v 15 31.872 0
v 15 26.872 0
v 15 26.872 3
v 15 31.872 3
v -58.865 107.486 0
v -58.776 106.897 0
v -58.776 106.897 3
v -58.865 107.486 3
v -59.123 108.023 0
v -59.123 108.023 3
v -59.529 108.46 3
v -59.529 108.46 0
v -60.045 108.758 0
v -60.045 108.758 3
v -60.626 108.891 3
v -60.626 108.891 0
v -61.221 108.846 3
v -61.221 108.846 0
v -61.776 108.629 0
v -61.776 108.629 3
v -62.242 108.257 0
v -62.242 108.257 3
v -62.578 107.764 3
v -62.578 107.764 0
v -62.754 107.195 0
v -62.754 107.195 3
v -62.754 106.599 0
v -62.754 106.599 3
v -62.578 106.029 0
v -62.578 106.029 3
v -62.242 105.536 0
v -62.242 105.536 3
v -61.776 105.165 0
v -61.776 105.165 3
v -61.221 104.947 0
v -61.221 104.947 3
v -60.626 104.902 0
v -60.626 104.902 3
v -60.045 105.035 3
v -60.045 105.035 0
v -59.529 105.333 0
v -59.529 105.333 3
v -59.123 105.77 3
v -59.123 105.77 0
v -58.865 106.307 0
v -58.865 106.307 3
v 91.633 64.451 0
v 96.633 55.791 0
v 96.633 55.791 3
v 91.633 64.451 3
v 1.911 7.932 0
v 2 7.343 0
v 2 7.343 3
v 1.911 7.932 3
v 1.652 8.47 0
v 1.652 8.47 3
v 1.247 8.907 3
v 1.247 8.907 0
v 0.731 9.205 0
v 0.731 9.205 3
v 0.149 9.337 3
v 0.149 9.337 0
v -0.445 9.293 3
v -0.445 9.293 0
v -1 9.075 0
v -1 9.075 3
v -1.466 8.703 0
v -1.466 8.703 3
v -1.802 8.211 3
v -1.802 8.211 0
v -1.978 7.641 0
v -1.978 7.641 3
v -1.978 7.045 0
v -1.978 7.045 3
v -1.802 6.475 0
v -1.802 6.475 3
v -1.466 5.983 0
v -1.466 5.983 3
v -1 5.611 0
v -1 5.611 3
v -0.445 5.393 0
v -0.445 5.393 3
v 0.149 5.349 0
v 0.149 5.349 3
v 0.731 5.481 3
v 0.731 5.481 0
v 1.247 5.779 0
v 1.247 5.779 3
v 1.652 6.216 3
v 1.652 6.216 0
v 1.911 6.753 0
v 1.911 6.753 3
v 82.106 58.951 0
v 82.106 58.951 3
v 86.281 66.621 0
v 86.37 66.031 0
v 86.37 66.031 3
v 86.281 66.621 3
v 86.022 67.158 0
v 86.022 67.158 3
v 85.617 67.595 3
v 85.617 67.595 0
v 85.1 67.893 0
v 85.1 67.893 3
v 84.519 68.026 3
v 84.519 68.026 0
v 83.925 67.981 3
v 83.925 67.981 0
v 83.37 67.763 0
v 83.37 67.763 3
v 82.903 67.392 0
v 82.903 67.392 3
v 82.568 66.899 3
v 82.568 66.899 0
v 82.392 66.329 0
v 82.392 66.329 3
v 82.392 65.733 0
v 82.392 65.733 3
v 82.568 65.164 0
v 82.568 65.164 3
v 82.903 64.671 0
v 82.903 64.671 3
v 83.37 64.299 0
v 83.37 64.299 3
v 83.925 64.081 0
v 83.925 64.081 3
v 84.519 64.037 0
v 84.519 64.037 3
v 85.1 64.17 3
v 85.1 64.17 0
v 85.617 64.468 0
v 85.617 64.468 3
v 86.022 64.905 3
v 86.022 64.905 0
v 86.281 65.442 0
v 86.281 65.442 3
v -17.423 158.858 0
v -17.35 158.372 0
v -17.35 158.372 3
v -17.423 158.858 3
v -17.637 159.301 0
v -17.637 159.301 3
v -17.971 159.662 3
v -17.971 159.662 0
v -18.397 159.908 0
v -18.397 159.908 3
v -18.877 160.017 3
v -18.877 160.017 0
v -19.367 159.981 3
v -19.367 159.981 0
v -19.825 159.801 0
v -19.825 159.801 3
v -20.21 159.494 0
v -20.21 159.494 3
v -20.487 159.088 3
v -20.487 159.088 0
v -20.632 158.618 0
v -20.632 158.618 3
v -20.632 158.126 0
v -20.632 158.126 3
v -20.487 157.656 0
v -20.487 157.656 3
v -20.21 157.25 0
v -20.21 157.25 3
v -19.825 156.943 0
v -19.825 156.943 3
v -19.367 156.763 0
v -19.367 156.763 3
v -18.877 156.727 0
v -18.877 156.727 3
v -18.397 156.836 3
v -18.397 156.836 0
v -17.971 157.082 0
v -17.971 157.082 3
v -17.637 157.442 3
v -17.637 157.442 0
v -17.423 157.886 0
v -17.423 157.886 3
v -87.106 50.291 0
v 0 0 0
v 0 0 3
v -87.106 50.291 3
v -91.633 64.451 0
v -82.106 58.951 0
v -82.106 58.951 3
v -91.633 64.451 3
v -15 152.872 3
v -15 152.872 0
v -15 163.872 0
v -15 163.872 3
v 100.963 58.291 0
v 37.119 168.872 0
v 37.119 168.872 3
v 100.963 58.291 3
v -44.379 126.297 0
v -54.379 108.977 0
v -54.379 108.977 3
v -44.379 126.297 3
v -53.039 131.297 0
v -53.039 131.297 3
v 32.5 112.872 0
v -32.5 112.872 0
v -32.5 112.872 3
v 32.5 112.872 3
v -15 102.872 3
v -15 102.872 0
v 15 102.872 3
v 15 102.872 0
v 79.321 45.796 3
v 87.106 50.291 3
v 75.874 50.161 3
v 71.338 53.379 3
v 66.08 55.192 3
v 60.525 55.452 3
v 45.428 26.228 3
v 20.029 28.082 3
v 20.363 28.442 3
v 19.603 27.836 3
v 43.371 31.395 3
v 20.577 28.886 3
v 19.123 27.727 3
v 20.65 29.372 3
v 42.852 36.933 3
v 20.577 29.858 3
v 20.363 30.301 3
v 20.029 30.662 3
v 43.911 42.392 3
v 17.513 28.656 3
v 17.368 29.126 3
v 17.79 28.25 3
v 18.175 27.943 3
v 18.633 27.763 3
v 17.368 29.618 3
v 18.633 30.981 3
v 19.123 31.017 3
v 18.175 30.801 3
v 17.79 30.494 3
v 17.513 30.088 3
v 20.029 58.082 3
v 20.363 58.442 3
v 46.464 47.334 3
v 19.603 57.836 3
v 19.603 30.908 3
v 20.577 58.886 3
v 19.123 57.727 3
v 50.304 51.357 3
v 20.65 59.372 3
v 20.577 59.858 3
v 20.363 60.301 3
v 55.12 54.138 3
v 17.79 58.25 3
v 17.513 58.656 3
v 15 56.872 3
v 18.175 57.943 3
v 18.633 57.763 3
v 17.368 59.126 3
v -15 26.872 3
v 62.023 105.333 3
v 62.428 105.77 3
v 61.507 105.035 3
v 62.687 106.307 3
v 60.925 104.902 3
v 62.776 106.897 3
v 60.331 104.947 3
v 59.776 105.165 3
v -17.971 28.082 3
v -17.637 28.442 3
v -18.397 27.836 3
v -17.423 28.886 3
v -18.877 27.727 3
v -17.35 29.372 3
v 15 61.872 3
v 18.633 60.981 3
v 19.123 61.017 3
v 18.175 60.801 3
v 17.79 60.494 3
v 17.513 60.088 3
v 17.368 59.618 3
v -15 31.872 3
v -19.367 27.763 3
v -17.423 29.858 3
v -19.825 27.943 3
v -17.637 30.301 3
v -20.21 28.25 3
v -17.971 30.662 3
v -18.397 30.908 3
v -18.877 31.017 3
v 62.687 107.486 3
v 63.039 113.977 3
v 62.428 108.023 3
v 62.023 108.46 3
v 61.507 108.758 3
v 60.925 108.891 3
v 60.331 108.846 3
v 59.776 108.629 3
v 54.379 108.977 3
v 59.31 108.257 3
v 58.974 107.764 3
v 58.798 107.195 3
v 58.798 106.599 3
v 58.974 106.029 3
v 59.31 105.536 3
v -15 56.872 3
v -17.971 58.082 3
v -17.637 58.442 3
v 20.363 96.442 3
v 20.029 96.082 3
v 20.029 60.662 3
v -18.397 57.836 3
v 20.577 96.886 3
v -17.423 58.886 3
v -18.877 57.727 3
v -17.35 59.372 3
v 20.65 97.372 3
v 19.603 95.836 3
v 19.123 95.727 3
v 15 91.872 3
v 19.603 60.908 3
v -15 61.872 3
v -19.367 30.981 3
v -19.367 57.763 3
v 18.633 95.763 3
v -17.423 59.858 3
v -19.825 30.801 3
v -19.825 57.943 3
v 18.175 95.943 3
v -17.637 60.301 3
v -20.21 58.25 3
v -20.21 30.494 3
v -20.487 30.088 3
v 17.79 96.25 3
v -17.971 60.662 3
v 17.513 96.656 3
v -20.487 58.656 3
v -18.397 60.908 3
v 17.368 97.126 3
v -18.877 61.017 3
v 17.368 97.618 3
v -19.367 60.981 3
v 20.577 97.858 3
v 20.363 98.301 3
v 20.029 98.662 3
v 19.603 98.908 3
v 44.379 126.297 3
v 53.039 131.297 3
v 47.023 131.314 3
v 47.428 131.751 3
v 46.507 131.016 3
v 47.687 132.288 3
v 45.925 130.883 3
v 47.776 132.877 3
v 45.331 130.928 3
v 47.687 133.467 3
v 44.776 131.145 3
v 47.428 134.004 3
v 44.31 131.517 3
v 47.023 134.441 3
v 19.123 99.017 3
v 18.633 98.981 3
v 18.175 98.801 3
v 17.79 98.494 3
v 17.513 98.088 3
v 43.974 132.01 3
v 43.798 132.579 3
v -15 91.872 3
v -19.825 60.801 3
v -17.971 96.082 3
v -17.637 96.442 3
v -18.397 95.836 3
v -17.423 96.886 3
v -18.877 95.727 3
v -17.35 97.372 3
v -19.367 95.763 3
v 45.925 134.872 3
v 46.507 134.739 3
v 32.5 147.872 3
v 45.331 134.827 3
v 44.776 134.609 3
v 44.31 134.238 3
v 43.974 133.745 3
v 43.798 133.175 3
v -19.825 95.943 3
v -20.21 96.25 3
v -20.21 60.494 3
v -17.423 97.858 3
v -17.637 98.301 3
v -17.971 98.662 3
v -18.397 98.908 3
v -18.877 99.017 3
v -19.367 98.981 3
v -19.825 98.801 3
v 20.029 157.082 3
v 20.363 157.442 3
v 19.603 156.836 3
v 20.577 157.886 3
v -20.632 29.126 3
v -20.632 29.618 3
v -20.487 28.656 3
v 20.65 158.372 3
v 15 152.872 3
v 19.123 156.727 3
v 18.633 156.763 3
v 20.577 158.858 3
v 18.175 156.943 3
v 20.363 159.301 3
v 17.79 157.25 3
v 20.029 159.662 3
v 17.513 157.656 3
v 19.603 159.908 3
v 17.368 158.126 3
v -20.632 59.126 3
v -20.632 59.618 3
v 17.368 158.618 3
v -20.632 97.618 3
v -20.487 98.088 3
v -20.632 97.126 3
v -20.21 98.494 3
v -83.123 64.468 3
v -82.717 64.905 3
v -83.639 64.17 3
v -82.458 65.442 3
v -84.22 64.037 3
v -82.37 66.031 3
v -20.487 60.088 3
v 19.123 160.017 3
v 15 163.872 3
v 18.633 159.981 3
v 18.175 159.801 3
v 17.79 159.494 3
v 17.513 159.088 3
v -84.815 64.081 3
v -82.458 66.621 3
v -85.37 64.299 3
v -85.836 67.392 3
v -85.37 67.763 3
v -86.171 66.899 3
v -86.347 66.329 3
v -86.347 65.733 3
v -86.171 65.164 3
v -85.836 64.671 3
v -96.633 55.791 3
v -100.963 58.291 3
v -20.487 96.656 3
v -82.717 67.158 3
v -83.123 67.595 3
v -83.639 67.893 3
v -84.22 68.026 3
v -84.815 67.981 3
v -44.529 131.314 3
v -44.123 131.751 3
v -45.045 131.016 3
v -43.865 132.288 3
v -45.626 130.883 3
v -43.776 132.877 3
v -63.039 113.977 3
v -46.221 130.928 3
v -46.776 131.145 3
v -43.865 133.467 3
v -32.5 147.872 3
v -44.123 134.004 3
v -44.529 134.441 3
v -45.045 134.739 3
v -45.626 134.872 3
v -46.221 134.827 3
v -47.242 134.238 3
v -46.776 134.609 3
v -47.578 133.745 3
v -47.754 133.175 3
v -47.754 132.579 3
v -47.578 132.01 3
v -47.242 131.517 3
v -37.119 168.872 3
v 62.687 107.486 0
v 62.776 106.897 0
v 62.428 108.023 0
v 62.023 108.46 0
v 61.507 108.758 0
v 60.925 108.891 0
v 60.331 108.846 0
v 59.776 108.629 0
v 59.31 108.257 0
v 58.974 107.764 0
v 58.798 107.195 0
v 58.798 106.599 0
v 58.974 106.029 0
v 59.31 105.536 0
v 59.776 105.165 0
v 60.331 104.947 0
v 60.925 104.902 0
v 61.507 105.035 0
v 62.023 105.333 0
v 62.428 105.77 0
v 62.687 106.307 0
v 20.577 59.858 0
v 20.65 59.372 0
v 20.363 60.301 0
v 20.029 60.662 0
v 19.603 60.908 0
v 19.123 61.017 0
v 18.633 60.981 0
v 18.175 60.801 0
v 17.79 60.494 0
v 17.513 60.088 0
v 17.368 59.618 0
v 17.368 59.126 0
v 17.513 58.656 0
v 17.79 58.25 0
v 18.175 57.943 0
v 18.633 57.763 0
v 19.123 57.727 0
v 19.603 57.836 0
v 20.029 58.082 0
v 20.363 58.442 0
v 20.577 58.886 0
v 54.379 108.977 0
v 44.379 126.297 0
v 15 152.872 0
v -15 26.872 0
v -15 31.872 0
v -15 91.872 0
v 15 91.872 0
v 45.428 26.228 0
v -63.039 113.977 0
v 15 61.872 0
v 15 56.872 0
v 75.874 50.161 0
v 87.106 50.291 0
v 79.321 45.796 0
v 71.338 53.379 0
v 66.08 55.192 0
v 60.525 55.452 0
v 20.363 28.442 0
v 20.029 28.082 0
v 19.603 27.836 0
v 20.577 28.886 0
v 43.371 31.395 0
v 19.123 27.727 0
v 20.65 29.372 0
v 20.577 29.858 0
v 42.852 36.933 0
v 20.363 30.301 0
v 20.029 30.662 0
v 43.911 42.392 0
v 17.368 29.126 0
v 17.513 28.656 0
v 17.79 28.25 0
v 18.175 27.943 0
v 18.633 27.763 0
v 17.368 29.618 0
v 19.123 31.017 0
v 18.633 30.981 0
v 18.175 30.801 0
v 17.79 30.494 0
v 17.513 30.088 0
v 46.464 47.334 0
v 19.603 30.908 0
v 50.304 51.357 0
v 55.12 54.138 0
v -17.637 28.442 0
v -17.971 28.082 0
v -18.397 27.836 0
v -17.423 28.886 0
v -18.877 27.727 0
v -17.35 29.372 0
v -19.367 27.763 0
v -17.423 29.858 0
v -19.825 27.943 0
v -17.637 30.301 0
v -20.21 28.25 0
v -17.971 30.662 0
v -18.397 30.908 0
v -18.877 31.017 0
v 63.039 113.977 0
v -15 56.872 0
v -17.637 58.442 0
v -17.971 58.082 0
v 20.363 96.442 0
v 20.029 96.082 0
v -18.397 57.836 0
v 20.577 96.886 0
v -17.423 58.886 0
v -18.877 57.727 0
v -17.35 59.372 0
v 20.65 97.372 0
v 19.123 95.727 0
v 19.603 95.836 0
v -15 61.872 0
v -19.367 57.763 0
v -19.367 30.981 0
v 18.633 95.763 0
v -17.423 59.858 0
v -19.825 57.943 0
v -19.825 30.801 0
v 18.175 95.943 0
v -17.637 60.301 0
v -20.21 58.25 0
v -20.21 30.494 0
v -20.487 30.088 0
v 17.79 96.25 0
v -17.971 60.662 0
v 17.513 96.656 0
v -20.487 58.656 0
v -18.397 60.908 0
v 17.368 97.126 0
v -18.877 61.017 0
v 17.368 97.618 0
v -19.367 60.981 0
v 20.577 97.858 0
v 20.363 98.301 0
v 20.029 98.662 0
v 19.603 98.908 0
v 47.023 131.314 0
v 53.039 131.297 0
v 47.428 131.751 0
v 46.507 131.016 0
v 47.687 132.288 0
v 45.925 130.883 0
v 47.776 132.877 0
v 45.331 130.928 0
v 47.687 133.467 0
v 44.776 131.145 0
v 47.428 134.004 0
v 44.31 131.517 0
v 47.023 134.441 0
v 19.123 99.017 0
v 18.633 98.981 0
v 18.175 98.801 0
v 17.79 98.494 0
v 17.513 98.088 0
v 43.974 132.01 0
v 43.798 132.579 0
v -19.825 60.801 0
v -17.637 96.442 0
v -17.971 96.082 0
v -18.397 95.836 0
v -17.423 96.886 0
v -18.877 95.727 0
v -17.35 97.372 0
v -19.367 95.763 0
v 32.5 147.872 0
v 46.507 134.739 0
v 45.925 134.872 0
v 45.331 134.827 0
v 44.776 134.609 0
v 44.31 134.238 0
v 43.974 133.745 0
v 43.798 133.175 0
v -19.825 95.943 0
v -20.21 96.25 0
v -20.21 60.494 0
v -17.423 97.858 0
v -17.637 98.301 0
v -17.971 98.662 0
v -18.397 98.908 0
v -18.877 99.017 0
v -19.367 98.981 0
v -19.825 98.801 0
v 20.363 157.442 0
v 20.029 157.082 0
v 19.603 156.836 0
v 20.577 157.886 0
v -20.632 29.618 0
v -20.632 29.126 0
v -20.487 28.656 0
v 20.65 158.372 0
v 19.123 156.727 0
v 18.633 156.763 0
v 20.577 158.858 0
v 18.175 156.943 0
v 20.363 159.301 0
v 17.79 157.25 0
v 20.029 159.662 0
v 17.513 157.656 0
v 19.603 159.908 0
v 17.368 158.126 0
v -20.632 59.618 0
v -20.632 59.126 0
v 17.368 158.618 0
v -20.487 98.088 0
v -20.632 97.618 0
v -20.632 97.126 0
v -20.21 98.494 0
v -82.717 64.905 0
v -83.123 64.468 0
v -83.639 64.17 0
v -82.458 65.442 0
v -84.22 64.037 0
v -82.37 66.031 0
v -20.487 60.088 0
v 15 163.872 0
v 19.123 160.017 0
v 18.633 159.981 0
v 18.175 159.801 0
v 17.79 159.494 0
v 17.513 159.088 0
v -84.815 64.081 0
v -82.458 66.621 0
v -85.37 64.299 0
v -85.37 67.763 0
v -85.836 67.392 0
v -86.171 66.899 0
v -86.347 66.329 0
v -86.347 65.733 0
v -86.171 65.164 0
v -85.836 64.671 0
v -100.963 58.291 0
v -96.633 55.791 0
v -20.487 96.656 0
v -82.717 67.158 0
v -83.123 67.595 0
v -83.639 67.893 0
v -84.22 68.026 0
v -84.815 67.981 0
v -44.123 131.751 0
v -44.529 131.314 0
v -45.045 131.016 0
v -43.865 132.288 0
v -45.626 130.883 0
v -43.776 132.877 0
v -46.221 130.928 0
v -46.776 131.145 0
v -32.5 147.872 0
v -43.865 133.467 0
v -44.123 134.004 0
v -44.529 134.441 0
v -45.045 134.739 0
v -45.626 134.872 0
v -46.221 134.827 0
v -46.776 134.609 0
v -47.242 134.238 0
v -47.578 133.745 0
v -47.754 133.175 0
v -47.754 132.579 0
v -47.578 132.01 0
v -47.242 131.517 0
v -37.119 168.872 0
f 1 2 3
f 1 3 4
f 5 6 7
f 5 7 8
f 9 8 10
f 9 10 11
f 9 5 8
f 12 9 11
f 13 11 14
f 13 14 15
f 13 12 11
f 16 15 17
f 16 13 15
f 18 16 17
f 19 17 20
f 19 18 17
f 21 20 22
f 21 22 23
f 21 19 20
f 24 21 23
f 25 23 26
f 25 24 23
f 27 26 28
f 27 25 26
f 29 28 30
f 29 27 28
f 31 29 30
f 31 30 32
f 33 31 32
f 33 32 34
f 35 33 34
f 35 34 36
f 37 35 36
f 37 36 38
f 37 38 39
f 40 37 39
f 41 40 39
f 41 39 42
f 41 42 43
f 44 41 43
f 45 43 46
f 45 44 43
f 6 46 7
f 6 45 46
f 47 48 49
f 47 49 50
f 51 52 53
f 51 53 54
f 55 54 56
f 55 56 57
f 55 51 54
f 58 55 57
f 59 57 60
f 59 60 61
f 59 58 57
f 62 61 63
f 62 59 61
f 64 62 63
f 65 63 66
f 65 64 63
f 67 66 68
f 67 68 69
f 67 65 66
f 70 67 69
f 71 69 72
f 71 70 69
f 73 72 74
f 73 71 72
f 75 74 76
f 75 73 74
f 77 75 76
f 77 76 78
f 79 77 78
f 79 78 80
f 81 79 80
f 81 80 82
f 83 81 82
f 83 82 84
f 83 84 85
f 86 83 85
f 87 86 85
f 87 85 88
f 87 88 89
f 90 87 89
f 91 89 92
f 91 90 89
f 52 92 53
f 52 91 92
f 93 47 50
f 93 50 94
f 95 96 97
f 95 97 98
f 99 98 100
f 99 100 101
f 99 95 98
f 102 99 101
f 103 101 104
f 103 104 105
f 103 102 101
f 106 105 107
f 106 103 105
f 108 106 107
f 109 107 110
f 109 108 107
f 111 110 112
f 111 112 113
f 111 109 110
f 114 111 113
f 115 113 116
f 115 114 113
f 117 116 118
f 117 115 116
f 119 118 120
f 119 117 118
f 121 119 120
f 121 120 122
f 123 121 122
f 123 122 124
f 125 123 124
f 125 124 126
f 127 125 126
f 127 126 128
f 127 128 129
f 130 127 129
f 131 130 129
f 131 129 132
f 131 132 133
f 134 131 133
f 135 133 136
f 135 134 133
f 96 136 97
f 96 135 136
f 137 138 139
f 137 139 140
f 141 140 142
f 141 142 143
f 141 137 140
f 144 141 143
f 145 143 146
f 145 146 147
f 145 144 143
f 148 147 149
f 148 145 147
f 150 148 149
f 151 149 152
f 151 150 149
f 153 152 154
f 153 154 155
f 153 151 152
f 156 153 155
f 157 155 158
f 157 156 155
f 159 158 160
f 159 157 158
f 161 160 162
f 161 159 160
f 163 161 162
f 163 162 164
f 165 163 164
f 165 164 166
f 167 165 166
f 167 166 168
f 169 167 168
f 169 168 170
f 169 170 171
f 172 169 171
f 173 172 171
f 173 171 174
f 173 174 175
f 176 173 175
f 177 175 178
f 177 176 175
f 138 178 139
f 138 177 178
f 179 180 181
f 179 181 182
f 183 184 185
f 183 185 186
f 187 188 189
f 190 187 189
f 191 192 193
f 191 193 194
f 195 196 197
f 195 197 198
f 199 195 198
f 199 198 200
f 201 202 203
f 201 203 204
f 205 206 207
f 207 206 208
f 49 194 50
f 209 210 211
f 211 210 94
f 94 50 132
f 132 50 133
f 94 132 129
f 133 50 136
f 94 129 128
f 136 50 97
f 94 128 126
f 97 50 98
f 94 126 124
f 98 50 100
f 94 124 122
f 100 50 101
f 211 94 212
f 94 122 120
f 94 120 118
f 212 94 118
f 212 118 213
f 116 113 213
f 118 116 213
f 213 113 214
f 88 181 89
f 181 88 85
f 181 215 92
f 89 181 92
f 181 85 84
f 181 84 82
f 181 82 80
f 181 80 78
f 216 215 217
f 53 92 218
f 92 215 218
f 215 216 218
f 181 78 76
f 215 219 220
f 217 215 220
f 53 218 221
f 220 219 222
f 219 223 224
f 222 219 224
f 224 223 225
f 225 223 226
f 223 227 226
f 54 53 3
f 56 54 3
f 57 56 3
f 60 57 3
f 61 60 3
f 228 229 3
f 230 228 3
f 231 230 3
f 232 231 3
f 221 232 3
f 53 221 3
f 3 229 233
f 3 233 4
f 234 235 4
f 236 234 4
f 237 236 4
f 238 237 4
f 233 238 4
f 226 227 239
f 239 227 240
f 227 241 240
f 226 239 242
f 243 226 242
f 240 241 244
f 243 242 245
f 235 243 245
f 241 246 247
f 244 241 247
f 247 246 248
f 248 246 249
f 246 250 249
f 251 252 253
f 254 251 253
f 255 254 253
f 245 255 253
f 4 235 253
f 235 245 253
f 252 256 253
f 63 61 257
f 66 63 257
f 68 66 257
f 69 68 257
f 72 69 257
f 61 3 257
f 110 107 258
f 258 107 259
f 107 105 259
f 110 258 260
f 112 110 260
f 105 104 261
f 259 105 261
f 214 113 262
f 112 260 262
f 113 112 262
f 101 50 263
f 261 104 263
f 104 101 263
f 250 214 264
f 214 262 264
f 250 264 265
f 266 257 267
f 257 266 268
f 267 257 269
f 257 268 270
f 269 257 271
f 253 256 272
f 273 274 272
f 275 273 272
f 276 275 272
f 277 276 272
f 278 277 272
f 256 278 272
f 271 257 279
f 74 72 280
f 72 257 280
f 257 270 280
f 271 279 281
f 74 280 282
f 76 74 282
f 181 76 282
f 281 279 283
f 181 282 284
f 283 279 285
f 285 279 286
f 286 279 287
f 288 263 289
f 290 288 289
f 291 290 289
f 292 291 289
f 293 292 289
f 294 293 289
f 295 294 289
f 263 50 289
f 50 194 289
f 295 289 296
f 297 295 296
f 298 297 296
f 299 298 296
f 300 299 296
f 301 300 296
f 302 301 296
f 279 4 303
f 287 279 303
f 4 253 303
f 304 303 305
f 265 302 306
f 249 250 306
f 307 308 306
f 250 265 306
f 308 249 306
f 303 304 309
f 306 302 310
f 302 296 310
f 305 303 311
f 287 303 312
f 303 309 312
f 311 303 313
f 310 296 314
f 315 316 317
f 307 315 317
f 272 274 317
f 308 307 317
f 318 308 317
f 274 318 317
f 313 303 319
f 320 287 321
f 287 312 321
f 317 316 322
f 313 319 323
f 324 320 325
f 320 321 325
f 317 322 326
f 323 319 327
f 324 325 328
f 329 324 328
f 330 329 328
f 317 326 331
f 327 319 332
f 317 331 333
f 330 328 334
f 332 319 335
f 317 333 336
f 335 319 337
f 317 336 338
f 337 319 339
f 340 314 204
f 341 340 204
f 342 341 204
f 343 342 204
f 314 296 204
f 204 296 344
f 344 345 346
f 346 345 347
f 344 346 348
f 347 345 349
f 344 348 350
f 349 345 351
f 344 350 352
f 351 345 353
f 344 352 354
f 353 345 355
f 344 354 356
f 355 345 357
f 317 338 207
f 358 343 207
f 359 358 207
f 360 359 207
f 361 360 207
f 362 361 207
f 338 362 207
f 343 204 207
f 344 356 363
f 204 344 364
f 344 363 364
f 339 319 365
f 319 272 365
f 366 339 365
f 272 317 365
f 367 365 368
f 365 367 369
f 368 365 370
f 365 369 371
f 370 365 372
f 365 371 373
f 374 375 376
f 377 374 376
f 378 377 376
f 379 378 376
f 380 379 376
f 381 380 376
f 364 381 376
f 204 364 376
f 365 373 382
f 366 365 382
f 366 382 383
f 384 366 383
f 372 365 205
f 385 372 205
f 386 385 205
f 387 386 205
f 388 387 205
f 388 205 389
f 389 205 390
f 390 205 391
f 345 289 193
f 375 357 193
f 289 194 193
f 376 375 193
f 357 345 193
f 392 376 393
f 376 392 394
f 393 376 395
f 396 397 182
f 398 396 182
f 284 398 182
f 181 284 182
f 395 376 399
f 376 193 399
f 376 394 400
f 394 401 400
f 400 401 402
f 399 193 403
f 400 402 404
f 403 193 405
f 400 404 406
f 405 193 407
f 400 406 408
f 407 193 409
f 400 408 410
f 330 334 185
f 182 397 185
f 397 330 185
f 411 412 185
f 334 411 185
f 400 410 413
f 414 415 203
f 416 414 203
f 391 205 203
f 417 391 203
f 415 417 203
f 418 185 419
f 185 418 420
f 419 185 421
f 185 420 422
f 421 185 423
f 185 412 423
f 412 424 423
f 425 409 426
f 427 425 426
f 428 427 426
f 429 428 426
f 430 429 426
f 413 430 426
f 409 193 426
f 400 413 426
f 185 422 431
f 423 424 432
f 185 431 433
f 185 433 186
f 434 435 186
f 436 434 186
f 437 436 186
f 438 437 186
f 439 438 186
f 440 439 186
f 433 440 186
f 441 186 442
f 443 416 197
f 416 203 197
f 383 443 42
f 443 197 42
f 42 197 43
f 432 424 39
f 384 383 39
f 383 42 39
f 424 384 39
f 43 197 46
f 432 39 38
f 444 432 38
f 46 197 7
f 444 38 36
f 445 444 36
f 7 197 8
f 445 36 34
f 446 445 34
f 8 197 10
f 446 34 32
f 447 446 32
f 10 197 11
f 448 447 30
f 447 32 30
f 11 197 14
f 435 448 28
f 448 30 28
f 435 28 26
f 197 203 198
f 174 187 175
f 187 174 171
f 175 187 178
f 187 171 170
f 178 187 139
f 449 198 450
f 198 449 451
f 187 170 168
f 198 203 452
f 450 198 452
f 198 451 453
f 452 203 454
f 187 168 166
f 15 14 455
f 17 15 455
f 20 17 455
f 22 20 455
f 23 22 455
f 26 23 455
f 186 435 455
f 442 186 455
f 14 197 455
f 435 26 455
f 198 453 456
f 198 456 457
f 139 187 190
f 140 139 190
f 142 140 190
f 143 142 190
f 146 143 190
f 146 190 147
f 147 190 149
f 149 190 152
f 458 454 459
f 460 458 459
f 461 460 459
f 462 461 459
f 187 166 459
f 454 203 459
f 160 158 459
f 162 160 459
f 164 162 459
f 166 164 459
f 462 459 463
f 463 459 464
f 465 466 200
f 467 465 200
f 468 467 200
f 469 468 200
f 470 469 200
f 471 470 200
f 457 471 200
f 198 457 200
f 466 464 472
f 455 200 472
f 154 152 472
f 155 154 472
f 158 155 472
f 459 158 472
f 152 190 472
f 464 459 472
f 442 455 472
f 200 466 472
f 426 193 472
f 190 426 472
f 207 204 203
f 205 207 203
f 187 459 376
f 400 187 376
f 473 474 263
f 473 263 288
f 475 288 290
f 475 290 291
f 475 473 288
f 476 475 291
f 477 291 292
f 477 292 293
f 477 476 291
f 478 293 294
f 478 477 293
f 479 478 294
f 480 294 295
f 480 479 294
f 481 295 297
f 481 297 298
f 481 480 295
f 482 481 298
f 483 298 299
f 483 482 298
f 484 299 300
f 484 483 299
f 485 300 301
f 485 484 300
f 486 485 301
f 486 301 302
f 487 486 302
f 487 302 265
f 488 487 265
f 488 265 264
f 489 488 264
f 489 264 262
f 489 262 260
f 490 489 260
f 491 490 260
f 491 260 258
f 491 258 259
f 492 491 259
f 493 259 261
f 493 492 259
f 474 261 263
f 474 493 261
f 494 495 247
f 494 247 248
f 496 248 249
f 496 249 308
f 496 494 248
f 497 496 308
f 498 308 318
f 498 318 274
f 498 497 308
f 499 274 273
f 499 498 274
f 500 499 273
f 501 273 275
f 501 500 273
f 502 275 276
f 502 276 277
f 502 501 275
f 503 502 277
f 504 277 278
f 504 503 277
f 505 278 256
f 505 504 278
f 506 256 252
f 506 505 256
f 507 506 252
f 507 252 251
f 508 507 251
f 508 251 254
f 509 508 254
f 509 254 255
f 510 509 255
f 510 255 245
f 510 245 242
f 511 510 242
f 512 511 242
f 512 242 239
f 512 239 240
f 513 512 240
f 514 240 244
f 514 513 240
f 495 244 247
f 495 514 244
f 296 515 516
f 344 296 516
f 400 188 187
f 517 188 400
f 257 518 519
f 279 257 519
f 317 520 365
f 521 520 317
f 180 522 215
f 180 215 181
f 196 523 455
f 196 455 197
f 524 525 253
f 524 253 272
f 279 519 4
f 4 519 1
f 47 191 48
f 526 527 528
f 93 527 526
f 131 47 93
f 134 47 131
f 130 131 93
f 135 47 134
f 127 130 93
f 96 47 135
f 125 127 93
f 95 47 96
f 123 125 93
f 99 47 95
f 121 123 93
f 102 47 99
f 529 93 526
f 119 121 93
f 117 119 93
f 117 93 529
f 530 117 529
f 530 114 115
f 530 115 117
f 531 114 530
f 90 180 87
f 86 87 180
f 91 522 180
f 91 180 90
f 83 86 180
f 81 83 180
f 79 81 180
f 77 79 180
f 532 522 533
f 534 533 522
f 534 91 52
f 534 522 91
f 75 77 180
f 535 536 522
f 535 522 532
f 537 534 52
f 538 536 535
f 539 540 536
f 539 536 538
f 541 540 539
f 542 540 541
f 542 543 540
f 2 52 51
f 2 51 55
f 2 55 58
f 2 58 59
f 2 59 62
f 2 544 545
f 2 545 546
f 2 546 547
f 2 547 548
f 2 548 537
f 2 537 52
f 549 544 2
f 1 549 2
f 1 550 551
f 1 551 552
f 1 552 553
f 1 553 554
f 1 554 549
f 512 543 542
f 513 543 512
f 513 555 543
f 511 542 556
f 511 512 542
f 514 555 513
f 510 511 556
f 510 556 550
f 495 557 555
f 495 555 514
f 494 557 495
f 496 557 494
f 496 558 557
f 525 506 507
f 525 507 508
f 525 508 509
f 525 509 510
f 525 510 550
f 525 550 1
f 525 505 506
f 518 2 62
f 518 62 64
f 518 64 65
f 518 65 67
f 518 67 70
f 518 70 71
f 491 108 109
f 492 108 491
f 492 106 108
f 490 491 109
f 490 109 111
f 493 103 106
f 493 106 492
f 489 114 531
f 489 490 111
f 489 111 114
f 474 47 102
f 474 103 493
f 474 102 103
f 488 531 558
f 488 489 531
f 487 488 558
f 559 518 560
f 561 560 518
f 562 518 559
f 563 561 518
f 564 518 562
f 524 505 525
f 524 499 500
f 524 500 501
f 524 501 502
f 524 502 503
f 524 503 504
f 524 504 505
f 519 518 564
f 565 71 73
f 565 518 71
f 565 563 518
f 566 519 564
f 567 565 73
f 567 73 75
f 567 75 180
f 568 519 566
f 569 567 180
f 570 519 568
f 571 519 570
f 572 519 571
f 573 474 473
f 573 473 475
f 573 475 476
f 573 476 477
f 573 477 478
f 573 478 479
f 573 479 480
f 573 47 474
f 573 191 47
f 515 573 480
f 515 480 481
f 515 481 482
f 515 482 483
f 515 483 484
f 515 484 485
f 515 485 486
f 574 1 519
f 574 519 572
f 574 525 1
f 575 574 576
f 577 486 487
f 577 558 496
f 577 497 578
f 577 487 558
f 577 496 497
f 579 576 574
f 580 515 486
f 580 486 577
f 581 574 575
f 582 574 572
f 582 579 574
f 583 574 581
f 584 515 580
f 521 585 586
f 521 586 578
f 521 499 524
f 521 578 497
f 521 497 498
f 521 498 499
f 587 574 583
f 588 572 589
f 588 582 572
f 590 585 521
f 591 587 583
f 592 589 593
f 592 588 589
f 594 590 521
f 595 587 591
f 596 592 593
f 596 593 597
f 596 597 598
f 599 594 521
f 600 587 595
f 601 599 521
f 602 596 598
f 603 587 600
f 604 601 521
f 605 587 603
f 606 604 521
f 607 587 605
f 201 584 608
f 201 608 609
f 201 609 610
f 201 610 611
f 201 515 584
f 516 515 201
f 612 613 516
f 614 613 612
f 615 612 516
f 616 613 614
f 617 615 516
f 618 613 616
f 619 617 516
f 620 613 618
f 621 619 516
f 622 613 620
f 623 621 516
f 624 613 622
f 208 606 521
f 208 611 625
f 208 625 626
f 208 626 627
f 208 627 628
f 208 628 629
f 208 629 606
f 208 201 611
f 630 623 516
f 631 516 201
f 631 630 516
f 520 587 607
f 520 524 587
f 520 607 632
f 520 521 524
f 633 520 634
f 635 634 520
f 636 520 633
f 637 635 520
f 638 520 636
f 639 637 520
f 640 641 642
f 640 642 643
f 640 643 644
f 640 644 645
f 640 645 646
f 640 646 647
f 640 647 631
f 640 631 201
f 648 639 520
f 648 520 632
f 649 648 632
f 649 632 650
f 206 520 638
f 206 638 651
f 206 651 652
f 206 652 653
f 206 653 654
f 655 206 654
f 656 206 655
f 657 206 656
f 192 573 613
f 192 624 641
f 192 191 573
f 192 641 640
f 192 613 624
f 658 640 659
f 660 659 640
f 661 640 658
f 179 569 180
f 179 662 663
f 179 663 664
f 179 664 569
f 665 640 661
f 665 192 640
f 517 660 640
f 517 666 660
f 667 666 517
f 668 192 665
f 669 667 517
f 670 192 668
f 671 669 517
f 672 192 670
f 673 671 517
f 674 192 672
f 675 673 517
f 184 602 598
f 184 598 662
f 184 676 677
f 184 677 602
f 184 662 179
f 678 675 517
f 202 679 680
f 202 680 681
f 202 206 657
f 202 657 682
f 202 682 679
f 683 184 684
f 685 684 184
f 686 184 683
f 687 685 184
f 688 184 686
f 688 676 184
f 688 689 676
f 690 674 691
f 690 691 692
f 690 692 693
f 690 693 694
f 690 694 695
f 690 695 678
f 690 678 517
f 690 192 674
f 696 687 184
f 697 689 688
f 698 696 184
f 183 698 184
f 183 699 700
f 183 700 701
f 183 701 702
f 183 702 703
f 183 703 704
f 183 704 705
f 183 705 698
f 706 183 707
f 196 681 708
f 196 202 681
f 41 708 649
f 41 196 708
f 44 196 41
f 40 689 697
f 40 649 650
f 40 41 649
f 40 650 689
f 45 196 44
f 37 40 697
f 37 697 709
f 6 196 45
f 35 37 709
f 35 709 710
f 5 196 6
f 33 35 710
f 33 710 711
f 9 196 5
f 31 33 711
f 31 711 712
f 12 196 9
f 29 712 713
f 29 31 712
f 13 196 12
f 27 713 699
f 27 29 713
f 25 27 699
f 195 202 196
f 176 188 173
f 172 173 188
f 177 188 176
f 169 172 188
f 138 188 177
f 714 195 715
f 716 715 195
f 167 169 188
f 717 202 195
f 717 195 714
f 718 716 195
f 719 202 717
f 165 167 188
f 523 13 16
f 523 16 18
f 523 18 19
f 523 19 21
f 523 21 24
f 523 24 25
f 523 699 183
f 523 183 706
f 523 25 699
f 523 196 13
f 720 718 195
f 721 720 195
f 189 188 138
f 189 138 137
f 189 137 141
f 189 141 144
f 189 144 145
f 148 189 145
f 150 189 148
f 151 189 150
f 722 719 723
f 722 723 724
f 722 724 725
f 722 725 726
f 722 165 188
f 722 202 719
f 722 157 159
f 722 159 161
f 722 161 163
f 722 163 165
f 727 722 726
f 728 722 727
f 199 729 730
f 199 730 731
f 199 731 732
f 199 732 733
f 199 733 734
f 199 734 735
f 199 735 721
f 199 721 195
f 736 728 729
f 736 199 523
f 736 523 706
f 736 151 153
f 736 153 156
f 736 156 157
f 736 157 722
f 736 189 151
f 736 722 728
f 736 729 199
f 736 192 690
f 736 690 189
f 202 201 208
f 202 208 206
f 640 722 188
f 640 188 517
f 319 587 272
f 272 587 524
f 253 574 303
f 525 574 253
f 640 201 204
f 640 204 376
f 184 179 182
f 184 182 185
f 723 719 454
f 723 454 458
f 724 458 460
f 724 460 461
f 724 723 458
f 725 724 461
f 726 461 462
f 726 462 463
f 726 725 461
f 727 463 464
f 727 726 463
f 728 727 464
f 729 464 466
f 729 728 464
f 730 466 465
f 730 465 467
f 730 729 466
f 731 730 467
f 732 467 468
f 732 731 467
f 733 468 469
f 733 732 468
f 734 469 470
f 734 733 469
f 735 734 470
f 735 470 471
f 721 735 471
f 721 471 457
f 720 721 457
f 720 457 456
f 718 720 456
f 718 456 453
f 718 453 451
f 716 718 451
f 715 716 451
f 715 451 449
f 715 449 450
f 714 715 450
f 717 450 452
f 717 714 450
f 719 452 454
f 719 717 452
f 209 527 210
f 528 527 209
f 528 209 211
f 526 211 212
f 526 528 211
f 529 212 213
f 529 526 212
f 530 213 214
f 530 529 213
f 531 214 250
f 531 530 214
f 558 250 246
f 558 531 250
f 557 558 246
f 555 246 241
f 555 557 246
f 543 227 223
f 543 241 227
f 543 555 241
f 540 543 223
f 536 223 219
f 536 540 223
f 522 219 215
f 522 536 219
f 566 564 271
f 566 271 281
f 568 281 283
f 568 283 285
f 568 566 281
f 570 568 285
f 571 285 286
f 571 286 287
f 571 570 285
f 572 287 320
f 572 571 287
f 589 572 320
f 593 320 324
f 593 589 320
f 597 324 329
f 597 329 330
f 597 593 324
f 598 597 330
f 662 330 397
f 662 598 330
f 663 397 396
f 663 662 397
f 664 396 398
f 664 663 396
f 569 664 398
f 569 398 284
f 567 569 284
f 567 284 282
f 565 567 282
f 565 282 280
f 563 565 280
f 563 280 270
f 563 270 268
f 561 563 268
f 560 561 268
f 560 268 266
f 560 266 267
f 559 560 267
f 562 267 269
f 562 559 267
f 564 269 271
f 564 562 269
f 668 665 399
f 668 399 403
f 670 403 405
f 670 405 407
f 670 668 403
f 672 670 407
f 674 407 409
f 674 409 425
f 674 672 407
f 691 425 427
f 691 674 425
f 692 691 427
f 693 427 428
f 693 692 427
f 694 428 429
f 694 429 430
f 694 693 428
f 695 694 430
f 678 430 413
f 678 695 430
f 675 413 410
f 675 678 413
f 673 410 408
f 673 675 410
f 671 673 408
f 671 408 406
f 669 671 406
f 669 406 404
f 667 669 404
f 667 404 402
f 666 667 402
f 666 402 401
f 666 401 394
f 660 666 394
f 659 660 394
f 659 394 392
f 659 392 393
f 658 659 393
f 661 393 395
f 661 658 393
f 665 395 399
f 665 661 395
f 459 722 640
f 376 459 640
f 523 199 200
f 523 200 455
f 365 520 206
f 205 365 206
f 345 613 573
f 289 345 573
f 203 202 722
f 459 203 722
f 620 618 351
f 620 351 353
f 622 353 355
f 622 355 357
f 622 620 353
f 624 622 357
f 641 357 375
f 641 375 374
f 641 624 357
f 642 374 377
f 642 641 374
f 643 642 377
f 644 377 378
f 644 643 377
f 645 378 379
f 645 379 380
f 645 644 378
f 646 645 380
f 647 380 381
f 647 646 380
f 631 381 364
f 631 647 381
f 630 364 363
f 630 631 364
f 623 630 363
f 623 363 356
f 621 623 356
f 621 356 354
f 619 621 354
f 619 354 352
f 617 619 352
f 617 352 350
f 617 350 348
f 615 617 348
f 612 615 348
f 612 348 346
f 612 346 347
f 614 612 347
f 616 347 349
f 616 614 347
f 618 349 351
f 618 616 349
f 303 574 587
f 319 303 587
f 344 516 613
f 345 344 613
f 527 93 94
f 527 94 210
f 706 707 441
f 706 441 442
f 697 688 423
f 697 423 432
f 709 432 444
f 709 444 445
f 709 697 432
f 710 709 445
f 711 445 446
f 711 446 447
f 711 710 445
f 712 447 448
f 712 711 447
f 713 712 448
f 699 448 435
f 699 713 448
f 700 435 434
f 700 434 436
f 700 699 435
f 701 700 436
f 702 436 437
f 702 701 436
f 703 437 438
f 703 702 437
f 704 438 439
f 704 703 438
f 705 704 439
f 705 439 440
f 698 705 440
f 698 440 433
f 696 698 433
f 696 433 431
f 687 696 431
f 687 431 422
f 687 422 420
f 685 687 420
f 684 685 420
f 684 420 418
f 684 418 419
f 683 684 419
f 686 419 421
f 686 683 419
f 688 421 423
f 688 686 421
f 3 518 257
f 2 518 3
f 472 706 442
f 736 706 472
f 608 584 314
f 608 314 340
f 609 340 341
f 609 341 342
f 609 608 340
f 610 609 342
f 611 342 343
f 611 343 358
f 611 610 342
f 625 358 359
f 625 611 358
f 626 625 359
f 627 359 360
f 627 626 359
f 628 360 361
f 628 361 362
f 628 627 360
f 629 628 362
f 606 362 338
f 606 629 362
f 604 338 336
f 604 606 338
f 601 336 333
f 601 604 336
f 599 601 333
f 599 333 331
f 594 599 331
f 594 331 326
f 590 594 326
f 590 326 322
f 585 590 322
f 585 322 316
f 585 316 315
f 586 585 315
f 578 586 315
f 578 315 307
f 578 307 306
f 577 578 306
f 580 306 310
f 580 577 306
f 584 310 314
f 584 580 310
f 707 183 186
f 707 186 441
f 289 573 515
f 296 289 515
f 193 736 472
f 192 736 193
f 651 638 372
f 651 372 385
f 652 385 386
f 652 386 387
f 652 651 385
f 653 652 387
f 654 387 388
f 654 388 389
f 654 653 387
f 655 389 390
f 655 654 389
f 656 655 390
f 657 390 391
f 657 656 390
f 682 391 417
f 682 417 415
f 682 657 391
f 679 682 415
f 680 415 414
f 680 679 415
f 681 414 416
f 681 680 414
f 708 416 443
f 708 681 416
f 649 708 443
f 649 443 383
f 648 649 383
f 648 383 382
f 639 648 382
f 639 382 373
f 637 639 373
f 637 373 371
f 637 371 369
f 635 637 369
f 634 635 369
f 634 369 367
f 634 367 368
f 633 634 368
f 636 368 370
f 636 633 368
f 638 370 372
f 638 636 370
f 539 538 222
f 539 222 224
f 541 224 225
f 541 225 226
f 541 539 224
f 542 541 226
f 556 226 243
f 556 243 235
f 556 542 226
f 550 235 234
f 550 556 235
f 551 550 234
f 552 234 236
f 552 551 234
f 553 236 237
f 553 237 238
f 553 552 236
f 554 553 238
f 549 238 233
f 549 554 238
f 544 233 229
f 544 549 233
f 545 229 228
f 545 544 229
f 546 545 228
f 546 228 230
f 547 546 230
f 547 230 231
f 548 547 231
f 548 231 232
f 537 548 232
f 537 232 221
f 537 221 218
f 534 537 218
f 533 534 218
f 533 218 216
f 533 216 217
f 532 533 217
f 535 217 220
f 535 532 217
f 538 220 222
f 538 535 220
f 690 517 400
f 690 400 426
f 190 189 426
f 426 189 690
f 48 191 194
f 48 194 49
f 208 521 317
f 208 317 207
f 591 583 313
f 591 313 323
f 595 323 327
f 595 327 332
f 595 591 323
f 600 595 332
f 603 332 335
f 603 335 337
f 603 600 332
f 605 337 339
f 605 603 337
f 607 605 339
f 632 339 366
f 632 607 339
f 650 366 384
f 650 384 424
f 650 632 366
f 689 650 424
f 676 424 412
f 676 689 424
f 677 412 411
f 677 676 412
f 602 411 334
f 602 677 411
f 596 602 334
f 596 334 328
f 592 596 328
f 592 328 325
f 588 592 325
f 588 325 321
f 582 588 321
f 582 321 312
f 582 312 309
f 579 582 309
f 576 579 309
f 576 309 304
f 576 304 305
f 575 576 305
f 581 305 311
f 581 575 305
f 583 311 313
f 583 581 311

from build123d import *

# Parameters (mm, degrees)
ESQUISSE1_R             = 2
ESQUISSE1_R_2           = 1.65
ESQUISSE1_W             = 65
ESQUISSE1_H             = 35
ESQUISSE1_W_2           = 30
ESQUISSE1_H_2           = 5
ESQUISSE1_H_3           = 11
BOSS_EXTRU_1_DEPTH      = 3
ENL_V_MAT_EXTRU_1_DEPTH = 10


with BuildPart() as part:
    # Esquisse1 → Boss.-Extru.1 (new body)
    with BuildSketch(Plane.XY):
        Polygon((37.118802154, 168.871977627), (100.962812921, 58.290907218), (96.632685902, 55.790907218), (91.632685902, 64.451161256), (82.106406461, 58.951161256), (87.106406461, 50.290907218), (0, 0), (-87.106406461, 50.290907218), (-82.106406461, 58.951161256), (-91.632685902, 64.451161256), (-96.632685902, 55.790907218), (-100.962812921, 58.290907218), (-37.118802154, 168.871977627), align=None)
        with Locations((-84.369546181, 66.031288275)):
            Circle(ESQUISSE1_R, mode=Mode.SUBTRACT)
        with Locations((84.369546181, 66.031288275)):
            Circle(ESQUISSE1_R, mode=Mode.SUBTRACT)
        with Locations((-19, 97.371977627)):
            Circle(ESQUISSE1_R_2, mode=Mode.SUBTRACT)
        with Locations((19, 97.371977627)):
            Circle(ESQUISSE1_R_2, mode=Mode.SUBTRACT)
        with Locations((19, 158.371977627)):
            Circle(ESQUISSE1_R_2, mode=Mode.SUBTRACT)
        with Locations((-19, 158.371977627)):
            Circle(ESQUISSE1_R_2, mode=Mode.SUBTRACT)
        with Locations((-19, 59.371977627)):
            Circle(ESQUISSE1_R_2, mode=Mode.SUBTRACT)
        with Locations((0, 7.342924489)):
            Circle(ESQUISSE1_R, mode=Mode.SUBTRACT)
        with Locations((19, 59.371977627)):
            Circle(ESQUISSE1_R_2, mode=Mode.SUBTRACT)
        with Locations((19, 29.371977627)):
            Circle(ESQUISSE1_R_2, mode=Mode.SUBTRACT)
        with Locations((-19, 29.371977627)):
            Circle(ESQUISSE1_R_2, mode=Mode.SUBTRACT)
        with Locations((-45.775934694, 132.877384219)):
            Circle(ESQUISSE1_R, mode=Mode.SUBTRACT)
        with Locations((-60.775934694, 106.896622105)):
            Circle(ESQUISSE1_R, mode=Mode.SUBTRACT)
        with Locations((60.775934694, 106.896622105)):
            Circle(ESQUISSE1_R, mode=Mode.SUBTRACT)
        with Locations((45.775934694, 132.877384219)):
            Circle(ESQUISSE1_R, mode=Mode.SUBTRACT)
        with Locations((0, 130.371977627)):
            Rectangle(ESQUISSE1_W, ESQUISSE1_H, mode=Mode.SUBTRACT)
        with Locations((0, 59.371977627)):
            Rectangle(ESQUISSE1_W_2, ESQUISSE1_H_2, mode=Mode.SUBTRACT)
        with Locations((0, 29.371977627)):
            Rectangle(ESQUISSE1_W_2, ESQUISSE1_H_2, mode=Mode.SUBTRACT)
        with Locations((0, 97.371977627)):
            Rectangle(ESQUISSE1_W_2, ESQUISSE1_H_3, mode=Mode.SUBTRACT)
        Polygon((-53.039074415, 131.2972572), (-63.039074415, 113.976749124), (-54.378820377, 108.976749124), (-44.378820377, 126.2972572), align=None, mode=Mode.SUBTRACT)
        Polygon((63.039074415, 113.976749124), (54.378820377, 108.976749124), (44.378820377, 126.2972572), (53.039074415, 131.2972572), align=None, mode=Mode.SUBTRACT)
        with Locations((0, 158.371977627)):
            Rectangle(ESQUISSE1_W_2, ESQUISSE1_H_3, mode=Mode.SUBTRACT)
    extrude(amount=BOSS_EXTRU_1_DEPTH)

    # Esquisse2 → Enlèv. mat.-Extru.1 (cut)
    with BuildSketch(Plane(origin=(0, 0, 0), x_dir=(-1, 0, 0), z_dir=(0, 0, -1))):
        with BuildLine():
            Line((-45.427639482, 26.227659884), (-79.321398517, 45.796230786))
            ThreePointArc((-79.321398517, 45.796230786), (-52.612809671, 52.91972186), (-45.427639482, 26.227659884))
        make_face()
    extrude(amount=-ENL_V_MAT_EXTRU_1_DEPTH, mode=Mode.SUBTRACT)


solid = part.part
